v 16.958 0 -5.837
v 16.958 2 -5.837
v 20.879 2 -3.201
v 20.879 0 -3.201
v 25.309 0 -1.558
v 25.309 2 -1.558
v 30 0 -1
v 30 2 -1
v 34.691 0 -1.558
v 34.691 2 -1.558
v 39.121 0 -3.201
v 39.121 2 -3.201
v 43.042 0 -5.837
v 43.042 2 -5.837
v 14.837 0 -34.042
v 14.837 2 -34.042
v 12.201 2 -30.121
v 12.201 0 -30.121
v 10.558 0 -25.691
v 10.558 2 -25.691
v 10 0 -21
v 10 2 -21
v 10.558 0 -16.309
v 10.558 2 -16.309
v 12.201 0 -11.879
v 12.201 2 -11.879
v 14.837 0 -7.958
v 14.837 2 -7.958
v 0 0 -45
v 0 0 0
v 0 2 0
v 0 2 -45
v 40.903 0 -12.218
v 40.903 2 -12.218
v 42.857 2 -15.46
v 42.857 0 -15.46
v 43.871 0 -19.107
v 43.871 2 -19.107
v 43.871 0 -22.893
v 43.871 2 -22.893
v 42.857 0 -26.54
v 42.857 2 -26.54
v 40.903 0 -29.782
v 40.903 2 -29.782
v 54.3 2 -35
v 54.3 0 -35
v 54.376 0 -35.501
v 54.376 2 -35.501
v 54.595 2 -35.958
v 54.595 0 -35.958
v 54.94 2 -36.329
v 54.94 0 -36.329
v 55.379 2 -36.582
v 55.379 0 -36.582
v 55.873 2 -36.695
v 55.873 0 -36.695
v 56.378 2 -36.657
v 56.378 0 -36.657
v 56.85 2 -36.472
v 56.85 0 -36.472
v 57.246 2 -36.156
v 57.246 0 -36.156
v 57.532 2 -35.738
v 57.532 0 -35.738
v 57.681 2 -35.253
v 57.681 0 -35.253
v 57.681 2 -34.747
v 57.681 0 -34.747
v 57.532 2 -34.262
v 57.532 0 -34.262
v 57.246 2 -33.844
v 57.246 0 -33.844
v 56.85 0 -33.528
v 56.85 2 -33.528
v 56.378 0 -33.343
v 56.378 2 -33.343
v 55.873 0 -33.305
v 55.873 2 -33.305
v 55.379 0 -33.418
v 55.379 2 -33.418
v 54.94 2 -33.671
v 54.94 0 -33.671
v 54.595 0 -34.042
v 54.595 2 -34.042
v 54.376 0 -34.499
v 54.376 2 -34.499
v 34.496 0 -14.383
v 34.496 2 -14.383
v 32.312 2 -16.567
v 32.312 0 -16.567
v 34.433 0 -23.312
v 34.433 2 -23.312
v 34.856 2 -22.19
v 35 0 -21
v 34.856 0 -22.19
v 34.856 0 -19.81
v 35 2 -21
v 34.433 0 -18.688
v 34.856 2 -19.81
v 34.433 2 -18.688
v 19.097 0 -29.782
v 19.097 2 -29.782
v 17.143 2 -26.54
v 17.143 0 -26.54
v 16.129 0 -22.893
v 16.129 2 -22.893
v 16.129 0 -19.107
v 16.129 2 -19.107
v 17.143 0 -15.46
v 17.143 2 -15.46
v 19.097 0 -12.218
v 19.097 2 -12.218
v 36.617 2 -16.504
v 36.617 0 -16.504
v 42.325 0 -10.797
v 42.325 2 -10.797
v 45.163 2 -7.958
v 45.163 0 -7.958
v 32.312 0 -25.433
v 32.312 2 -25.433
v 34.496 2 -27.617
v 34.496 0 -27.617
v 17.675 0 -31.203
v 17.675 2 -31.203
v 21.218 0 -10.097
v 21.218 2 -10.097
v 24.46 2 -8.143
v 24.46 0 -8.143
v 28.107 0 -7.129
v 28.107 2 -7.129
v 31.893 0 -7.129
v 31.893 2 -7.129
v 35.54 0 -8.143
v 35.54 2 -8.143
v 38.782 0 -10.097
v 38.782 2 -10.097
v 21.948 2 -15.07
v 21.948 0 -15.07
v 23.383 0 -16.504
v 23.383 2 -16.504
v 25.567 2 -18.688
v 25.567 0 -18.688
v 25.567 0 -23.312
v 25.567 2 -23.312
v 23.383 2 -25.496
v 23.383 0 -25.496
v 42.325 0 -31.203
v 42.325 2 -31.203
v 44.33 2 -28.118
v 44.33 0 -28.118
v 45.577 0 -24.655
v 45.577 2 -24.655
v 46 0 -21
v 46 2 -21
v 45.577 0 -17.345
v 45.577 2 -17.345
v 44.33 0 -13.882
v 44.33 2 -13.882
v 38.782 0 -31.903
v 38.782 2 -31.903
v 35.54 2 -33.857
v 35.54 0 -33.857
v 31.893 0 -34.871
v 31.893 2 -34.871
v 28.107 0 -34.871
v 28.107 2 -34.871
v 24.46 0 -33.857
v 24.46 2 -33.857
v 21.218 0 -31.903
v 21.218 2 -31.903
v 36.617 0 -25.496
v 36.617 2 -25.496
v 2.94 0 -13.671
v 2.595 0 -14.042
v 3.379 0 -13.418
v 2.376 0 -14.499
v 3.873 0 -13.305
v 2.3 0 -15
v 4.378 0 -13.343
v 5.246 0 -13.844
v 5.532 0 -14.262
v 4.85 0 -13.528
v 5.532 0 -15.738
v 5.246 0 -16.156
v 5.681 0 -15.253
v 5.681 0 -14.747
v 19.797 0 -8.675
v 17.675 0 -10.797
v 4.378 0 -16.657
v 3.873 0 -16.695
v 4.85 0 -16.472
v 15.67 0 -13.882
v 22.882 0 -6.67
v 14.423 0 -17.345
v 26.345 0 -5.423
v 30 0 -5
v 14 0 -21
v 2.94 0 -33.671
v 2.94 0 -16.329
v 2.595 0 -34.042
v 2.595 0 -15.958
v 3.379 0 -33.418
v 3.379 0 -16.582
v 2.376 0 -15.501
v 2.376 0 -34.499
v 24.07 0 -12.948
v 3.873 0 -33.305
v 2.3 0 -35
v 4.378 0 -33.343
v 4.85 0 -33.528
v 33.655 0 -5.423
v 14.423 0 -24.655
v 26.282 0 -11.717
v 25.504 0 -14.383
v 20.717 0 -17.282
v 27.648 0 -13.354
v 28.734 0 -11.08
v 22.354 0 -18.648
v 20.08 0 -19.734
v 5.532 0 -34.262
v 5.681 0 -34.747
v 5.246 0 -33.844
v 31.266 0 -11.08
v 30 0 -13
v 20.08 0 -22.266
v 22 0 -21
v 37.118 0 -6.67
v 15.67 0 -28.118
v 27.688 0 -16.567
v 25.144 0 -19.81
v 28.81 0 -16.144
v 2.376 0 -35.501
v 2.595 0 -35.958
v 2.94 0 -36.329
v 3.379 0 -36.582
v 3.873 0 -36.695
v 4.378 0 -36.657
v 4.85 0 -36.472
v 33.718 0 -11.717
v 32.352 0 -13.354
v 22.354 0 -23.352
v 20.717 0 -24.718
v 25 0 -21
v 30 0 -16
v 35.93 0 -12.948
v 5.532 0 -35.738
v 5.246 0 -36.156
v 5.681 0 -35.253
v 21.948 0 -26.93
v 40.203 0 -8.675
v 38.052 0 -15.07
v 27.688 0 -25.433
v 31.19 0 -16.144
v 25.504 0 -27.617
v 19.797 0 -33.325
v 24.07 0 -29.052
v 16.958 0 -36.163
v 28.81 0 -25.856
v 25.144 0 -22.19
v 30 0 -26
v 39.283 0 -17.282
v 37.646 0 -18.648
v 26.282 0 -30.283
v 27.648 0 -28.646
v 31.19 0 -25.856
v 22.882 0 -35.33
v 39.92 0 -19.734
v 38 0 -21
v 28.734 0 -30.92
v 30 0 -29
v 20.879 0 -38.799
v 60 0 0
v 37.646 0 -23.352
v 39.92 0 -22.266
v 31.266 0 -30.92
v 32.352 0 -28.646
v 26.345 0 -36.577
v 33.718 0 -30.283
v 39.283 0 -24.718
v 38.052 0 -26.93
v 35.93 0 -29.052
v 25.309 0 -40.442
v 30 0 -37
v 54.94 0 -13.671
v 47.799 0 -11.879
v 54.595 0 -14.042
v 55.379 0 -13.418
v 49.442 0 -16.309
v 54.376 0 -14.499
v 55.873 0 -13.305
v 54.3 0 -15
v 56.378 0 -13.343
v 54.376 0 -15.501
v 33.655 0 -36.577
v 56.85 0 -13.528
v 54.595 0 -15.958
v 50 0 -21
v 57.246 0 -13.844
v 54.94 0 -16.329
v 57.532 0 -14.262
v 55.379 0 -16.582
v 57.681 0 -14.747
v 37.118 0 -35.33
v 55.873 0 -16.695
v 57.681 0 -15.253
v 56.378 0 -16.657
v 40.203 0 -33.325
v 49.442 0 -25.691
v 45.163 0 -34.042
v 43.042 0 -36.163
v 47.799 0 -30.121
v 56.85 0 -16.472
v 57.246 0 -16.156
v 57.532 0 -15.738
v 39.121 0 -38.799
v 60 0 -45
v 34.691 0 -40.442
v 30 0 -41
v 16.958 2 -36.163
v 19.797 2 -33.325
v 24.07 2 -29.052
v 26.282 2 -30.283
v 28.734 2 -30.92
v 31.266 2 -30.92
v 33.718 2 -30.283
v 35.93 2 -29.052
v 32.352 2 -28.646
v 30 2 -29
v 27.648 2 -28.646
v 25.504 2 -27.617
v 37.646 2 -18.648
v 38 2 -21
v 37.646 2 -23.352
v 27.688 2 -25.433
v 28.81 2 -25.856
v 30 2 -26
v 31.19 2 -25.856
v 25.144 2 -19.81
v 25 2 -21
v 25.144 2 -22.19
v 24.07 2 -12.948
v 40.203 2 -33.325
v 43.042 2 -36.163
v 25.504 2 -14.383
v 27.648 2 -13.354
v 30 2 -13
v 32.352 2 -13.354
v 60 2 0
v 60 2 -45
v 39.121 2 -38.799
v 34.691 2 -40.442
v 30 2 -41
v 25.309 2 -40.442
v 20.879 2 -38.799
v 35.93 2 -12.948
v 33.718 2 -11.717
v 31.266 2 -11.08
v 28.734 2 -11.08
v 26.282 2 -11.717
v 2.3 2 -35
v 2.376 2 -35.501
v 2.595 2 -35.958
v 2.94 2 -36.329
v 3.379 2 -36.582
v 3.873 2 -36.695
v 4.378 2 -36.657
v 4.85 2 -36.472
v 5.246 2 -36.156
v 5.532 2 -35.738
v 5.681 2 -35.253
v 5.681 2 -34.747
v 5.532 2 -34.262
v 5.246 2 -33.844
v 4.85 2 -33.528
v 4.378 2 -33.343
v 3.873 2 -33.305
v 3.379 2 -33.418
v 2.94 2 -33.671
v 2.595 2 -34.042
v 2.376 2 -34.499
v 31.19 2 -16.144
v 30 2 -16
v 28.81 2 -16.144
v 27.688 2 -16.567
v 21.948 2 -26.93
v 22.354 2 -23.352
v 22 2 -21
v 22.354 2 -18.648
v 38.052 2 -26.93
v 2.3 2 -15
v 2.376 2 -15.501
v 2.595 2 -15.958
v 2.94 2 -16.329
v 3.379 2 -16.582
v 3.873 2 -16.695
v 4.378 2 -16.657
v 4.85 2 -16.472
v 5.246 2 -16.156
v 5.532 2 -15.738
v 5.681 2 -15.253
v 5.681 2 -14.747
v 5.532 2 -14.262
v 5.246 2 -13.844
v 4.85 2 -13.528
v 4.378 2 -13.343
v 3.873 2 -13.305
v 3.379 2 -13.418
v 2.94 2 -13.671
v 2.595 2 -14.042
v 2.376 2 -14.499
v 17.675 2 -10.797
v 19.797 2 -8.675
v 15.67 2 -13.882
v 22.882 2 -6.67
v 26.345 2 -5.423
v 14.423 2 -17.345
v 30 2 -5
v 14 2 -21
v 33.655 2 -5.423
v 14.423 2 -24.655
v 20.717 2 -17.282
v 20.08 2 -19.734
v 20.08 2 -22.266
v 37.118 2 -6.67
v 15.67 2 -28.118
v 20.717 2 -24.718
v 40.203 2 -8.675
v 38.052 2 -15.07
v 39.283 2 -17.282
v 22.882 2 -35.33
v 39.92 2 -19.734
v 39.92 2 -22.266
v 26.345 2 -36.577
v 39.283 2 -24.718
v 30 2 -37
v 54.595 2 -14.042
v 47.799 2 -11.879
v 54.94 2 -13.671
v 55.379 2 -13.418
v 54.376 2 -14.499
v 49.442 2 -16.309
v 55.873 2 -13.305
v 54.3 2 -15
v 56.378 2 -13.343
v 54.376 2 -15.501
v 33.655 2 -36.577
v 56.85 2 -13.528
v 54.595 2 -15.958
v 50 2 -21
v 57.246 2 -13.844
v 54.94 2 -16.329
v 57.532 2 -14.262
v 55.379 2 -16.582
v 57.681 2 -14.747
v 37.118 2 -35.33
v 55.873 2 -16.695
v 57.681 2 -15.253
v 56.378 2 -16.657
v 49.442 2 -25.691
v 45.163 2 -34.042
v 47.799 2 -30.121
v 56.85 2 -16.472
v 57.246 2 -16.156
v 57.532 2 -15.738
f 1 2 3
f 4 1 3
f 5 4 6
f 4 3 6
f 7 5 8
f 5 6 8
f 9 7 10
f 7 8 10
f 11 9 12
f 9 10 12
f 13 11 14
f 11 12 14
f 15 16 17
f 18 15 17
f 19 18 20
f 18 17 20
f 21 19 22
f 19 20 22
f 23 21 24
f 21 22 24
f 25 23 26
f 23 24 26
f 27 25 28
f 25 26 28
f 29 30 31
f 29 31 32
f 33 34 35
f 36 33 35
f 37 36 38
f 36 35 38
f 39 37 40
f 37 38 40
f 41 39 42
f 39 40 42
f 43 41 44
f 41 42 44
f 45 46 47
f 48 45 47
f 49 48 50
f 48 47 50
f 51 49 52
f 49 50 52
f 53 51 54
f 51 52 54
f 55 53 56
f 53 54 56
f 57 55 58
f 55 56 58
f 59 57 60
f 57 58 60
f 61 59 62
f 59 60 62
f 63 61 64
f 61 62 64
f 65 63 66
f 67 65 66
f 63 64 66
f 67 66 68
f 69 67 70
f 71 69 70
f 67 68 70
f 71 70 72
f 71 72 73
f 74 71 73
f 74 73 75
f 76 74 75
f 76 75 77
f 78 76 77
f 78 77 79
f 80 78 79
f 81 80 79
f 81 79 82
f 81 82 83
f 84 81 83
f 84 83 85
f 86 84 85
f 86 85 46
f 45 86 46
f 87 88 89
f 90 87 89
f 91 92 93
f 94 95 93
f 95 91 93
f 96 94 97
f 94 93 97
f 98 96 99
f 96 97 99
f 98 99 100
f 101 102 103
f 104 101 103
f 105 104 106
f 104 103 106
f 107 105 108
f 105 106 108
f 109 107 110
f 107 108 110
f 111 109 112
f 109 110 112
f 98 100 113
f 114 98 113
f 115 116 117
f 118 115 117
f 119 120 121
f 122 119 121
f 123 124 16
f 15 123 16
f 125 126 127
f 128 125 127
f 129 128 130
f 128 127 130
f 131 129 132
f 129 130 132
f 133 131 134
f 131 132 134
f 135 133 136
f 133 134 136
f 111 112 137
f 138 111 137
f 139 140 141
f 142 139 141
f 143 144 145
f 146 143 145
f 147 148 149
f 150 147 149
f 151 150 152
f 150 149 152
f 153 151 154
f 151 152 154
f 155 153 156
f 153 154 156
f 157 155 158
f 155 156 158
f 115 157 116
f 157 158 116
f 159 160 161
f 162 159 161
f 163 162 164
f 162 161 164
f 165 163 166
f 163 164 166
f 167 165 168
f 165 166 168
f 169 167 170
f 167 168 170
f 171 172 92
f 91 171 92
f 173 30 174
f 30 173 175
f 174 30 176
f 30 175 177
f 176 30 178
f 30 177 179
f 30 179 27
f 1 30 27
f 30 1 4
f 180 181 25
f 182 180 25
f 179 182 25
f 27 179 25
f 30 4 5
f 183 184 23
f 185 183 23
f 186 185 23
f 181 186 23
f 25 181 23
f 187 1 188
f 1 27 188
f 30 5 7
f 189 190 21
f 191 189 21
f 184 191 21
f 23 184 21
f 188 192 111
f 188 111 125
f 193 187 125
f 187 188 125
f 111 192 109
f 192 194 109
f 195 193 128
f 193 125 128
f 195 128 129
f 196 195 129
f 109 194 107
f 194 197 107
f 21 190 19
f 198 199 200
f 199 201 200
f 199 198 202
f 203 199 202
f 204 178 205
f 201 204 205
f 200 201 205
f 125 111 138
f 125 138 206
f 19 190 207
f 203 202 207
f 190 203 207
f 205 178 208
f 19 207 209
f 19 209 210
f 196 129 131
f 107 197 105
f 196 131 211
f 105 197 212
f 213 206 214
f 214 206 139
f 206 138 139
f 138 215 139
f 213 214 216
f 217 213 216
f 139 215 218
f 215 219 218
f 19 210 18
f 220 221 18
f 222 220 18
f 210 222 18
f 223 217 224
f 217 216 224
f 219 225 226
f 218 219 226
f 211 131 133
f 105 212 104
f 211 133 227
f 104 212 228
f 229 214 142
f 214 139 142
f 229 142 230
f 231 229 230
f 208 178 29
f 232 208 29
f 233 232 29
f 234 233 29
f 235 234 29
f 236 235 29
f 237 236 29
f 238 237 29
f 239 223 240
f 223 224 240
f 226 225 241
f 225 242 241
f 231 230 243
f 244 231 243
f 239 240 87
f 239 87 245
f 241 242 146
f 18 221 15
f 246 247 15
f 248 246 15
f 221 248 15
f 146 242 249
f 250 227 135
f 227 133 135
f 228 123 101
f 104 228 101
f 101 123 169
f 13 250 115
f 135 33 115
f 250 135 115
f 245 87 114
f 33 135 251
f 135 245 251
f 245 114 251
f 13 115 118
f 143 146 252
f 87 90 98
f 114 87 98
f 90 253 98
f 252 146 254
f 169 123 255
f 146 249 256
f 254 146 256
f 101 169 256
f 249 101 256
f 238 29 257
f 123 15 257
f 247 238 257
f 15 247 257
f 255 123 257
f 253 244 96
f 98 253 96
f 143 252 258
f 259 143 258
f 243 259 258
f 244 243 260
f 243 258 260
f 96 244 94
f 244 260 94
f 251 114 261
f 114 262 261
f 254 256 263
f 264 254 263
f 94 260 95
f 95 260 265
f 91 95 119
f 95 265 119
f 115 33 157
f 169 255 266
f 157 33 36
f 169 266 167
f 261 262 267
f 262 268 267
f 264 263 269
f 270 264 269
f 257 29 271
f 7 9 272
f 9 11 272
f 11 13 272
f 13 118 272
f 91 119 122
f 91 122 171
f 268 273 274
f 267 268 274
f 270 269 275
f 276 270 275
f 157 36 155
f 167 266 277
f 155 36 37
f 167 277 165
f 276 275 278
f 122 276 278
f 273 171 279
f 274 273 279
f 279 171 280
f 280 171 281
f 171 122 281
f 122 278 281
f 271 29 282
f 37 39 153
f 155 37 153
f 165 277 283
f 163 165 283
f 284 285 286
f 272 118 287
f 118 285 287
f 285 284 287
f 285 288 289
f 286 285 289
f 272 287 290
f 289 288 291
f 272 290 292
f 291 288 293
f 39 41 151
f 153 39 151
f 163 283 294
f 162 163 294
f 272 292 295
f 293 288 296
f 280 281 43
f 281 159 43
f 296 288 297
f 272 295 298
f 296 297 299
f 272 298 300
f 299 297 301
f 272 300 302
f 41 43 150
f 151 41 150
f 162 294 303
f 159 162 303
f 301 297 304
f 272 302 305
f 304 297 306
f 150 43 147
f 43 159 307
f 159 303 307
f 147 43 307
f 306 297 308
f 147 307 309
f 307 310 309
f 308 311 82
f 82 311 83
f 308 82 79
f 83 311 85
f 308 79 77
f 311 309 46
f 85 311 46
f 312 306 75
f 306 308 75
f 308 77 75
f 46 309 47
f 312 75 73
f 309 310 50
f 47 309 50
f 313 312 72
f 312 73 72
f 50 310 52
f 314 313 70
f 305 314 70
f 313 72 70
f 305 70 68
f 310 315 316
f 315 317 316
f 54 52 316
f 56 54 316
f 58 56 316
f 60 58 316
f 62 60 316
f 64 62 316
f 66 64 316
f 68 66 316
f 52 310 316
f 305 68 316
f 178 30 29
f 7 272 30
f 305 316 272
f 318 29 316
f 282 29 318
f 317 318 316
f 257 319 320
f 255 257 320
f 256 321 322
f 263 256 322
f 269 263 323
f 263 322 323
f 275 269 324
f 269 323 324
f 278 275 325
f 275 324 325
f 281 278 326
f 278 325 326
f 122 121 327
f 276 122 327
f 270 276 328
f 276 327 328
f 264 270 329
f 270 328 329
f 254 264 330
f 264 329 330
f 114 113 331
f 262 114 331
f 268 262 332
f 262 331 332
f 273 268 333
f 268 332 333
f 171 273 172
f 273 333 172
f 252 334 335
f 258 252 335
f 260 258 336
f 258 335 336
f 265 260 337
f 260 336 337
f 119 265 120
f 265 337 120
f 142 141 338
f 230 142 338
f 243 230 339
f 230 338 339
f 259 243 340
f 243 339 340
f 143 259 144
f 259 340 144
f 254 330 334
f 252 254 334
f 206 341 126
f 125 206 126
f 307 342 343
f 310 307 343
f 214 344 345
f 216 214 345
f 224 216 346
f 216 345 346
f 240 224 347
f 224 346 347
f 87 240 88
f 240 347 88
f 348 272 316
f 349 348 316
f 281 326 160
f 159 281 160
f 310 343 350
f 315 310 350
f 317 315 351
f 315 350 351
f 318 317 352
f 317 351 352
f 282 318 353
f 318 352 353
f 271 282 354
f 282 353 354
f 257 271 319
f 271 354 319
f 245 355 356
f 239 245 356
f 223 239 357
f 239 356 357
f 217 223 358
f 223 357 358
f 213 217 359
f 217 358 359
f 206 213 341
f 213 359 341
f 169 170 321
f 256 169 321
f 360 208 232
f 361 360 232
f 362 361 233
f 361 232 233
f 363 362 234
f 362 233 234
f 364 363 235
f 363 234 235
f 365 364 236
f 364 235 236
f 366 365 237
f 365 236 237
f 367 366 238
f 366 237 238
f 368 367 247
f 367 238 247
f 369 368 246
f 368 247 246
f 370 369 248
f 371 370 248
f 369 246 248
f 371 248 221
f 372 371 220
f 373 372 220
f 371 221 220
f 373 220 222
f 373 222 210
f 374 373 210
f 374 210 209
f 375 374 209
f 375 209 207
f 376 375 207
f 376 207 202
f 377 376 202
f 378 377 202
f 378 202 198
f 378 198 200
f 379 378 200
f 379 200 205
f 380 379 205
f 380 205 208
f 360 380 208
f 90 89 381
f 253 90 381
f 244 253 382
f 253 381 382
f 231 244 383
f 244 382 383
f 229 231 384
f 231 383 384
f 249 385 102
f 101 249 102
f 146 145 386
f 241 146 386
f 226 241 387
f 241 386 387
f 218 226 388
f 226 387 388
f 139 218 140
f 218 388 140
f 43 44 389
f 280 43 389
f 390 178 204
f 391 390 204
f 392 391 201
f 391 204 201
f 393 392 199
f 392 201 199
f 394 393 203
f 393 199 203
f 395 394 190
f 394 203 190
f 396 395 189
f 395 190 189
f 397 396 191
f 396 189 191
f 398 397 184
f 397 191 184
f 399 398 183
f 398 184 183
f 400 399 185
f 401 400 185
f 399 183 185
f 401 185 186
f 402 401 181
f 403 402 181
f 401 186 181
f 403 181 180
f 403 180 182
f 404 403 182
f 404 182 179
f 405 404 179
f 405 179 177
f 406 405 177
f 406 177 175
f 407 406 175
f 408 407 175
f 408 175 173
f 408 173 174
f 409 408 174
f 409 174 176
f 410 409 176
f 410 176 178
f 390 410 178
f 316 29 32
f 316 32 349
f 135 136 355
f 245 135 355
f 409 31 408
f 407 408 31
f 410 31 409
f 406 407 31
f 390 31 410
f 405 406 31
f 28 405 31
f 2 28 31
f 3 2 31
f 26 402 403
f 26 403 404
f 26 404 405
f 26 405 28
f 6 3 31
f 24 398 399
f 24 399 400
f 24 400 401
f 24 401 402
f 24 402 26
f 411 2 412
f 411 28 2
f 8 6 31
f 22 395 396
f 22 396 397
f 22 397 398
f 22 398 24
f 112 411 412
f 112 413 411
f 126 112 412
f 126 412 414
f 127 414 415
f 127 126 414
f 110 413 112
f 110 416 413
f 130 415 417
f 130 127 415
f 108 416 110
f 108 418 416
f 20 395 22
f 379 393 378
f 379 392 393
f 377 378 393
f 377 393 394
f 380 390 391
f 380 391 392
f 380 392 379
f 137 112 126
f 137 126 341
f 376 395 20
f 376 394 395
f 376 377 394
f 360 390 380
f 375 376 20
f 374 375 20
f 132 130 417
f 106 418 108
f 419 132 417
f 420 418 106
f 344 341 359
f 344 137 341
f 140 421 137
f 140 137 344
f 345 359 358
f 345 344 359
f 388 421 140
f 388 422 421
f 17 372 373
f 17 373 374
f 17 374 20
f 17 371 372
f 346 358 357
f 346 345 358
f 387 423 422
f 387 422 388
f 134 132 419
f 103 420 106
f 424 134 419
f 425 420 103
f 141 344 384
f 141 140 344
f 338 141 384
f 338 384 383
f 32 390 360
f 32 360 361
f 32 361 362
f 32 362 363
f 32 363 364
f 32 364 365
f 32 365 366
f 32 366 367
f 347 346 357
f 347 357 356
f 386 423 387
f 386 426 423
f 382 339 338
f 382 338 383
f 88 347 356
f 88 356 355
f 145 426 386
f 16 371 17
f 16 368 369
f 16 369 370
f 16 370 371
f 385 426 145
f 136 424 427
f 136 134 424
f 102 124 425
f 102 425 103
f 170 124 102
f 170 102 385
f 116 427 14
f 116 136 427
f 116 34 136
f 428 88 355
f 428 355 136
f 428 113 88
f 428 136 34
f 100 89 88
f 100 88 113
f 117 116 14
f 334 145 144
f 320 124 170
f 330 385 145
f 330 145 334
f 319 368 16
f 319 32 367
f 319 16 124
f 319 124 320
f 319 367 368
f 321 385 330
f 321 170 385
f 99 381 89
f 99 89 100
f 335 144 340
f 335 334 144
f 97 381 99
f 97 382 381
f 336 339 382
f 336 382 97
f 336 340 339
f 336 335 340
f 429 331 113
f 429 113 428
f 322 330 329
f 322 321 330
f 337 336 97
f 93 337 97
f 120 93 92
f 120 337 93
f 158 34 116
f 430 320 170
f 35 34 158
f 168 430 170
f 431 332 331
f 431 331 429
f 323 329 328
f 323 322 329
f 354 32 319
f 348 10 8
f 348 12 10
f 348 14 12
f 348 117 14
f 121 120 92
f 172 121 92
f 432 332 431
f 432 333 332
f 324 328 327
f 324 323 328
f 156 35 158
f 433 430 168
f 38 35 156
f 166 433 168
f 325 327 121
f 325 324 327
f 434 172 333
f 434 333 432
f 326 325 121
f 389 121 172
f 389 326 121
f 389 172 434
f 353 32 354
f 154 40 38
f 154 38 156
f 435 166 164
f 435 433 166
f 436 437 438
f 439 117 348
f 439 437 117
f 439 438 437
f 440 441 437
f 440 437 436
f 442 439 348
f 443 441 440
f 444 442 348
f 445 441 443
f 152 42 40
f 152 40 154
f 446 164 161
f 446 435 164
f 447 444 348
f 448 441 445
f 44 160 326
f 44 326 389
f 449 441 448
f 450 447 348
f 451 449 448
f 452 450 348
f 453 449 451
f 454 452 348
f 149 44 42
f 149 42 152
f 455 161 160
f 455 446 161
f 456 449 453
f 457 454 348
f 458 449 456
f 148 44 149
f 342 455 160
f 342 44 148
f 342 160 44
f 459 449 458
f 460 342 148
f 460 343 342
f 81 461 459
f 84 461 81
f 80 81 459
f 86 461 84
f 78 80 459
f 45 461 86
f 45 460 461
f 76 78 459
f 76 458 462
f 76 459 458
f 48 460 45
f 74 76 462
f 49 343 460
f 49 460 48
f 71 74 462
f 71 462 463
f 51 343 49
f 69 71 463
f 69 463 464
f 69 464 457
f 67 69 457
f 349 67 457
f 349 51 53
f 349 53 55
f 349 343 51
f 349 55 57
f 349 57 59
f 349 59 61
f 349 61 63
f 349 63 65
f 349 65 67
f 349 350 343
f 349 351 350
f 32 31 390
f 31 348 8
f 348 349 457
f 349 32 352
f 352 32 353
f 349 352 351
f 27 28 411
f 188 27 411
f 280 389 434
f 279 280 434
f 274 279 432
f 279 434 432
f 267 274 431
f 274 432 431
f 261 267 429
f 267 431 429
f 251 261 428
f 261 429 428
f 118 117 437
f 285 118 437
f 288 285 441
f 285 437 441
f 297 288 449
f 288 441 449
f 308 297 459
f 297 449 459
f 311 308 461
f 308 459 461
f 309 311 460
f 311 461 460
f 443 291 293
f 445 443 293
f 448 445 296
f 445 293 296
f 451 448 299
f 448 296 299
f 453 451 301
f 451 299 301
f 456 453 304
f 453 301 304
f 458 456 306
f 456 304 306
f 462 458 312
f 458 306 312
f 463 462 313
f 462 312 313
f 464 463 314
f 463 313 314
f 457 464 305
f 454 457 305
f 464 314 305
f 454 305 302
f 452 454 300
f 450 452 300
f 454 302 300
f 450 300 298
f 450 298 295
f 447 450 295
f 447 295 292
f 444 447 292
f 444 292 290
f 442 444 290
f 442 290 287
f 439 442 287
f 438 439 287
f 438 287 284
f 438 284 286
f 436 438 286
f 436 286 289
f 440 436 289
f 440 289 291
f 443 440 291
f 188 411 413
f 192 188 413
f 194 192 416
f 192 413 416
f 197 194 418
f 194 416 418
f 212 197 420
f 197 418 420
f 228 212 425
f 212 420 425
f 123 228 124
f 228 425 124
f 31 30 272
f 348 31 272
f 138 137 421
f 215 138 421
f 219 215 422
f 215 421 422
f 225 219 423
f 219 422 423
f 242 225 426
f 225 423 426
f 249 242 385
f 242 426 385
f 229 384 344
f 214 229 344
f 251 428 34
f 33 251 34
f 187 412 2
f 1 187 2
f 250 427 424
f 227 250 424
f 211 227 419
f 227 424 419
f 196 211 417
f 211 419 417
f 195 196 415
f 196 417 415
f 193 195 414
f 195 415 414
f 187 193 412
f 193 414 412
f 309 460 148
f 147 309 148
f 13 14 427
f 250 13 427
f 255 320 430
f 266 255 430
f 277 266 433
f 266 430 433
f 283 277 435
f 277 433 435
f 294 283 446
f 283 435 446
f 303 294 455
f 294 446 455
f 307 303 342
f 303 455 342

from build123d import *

# Parameters (mm, degrees)
SKETCH1_W                  = 60
SKETCH1_H                  = 45
BOSS_EXTRUDE1_DEPTH        = 2
F_3_4_3_4_DIAMETER_HOLE1_D = 3.4
SKETCH5_R                  = 2.5
AIR_HOLES_DEPTH            = 76.026661928
CIRPATTERN1_COUNT          = 4
SKETCH6_R                  = 2.5
BOSS_EXTRUDE3_DEPTH        = 2


with BuildPart() as part:
    # Sketch1 → Boss-Extrude1 (new body)
    with BuildSketch(Plane(origin=(0, 0, 0), x_dir=(1, 0, 0), z_dir=(0, 1, 0))):
        with Locations((30, 22.5)):
            Rectangle(SKETCH1_W, SKETCH1_H)
    extrude(amount=BOSS_EXTRUDE1_DEPTH)

    # Ø3.4 (3.4) Diameter Hole1 (through all)
    with Locations(Plane(origin=(0, 2, 0), x_dir=(1, 0, 0), z_dir=(0, 1, 0))):
        with Locations((4, 15), (4, 35), (56, 35), (56, 15)):
            Hole(F_3_4_3_4_DIAMETER_HOLE1_D / 2)

    # Sketch5 → Air holes (cut, through all)
    with BuildSketch(Plane(origin=(0, 2, 0), x_dir=(1, 0, 0), z_dir=(0, 1, 0))):
        with Locations(Location((30, 21, 0), (0, 0, 270))):
            Circle(SKETCH5_R)
        with BuildLine():
            Line((21.218150329, 31.903170014), (24.069594445, 29.051725899))
            ThreePointArc((24.069594445, 29.051725899), (30, 31), (35.930405555, 29.051725899))
            Line((35.930405555, 29.051725899), (38.781849671, 31.903170014))
            ThreePointArc((38.781849671, 31.903170014), (30, 35), (21.218150329, 31.903170014))
        make_face()
        with BuildLine():
            Line((25.504132479, 27.617187865), (27.687975781, 25.433344563))
            ThreePointArc((27.687975781, 25.433344563), (30, 26), (32.312024219, 25.433344563))
            Line((32.312024219, 25.433344563), (34.495867521, 27.617187865))
            ThreePointArc((34.495867521, 27.617187865), (30, 29), (25.504132479, 27.617187865))
        make_face()
        with BuildLine():
            Line((40.203220154, 33.324540498), (43.041644604, 36.162964948))
            ThreePointArc((43.041644604, 36.162964948), (30, 41), (16.958355396, 36.162964948))
            Line((16.958355396, 36.162964948), (19.796779846, 33.324540498))
            ThreePointArc((19.796779846, 33.324540498), (30, 37), (40.203220154, 33.324540498))
        make_face()
    air_holes = extrude(amount=-AIR_HOLES_DEPTH, mode=Mode.SUBTRACT)

    # CirPattern1: Air holes ×4 about axis
    cirpattern1_axis = Axis((30, 0, -21), (0, 1, 0))
    for i in range(1, CIRPATTERN1_COUNT):
        add(air_holes.rotate(cirpattern1_axis, i * 360 / CIRPATTERN1_COUNT), mode=Mode.SUBTRACT)

    # Sketch6 → Boss-Extrude3 (add)
    with BuildSketch(Plane(origin=(0, 2, 0), x_dir=(1, 0, 0), z_dir=(0, 1, 0))):
        with Locations((30, 21)):
            Circle(SKETCH6_R)
    extrude(amount=-BOSS_EXTRUDE3_DEPTH)


solid = part.part
